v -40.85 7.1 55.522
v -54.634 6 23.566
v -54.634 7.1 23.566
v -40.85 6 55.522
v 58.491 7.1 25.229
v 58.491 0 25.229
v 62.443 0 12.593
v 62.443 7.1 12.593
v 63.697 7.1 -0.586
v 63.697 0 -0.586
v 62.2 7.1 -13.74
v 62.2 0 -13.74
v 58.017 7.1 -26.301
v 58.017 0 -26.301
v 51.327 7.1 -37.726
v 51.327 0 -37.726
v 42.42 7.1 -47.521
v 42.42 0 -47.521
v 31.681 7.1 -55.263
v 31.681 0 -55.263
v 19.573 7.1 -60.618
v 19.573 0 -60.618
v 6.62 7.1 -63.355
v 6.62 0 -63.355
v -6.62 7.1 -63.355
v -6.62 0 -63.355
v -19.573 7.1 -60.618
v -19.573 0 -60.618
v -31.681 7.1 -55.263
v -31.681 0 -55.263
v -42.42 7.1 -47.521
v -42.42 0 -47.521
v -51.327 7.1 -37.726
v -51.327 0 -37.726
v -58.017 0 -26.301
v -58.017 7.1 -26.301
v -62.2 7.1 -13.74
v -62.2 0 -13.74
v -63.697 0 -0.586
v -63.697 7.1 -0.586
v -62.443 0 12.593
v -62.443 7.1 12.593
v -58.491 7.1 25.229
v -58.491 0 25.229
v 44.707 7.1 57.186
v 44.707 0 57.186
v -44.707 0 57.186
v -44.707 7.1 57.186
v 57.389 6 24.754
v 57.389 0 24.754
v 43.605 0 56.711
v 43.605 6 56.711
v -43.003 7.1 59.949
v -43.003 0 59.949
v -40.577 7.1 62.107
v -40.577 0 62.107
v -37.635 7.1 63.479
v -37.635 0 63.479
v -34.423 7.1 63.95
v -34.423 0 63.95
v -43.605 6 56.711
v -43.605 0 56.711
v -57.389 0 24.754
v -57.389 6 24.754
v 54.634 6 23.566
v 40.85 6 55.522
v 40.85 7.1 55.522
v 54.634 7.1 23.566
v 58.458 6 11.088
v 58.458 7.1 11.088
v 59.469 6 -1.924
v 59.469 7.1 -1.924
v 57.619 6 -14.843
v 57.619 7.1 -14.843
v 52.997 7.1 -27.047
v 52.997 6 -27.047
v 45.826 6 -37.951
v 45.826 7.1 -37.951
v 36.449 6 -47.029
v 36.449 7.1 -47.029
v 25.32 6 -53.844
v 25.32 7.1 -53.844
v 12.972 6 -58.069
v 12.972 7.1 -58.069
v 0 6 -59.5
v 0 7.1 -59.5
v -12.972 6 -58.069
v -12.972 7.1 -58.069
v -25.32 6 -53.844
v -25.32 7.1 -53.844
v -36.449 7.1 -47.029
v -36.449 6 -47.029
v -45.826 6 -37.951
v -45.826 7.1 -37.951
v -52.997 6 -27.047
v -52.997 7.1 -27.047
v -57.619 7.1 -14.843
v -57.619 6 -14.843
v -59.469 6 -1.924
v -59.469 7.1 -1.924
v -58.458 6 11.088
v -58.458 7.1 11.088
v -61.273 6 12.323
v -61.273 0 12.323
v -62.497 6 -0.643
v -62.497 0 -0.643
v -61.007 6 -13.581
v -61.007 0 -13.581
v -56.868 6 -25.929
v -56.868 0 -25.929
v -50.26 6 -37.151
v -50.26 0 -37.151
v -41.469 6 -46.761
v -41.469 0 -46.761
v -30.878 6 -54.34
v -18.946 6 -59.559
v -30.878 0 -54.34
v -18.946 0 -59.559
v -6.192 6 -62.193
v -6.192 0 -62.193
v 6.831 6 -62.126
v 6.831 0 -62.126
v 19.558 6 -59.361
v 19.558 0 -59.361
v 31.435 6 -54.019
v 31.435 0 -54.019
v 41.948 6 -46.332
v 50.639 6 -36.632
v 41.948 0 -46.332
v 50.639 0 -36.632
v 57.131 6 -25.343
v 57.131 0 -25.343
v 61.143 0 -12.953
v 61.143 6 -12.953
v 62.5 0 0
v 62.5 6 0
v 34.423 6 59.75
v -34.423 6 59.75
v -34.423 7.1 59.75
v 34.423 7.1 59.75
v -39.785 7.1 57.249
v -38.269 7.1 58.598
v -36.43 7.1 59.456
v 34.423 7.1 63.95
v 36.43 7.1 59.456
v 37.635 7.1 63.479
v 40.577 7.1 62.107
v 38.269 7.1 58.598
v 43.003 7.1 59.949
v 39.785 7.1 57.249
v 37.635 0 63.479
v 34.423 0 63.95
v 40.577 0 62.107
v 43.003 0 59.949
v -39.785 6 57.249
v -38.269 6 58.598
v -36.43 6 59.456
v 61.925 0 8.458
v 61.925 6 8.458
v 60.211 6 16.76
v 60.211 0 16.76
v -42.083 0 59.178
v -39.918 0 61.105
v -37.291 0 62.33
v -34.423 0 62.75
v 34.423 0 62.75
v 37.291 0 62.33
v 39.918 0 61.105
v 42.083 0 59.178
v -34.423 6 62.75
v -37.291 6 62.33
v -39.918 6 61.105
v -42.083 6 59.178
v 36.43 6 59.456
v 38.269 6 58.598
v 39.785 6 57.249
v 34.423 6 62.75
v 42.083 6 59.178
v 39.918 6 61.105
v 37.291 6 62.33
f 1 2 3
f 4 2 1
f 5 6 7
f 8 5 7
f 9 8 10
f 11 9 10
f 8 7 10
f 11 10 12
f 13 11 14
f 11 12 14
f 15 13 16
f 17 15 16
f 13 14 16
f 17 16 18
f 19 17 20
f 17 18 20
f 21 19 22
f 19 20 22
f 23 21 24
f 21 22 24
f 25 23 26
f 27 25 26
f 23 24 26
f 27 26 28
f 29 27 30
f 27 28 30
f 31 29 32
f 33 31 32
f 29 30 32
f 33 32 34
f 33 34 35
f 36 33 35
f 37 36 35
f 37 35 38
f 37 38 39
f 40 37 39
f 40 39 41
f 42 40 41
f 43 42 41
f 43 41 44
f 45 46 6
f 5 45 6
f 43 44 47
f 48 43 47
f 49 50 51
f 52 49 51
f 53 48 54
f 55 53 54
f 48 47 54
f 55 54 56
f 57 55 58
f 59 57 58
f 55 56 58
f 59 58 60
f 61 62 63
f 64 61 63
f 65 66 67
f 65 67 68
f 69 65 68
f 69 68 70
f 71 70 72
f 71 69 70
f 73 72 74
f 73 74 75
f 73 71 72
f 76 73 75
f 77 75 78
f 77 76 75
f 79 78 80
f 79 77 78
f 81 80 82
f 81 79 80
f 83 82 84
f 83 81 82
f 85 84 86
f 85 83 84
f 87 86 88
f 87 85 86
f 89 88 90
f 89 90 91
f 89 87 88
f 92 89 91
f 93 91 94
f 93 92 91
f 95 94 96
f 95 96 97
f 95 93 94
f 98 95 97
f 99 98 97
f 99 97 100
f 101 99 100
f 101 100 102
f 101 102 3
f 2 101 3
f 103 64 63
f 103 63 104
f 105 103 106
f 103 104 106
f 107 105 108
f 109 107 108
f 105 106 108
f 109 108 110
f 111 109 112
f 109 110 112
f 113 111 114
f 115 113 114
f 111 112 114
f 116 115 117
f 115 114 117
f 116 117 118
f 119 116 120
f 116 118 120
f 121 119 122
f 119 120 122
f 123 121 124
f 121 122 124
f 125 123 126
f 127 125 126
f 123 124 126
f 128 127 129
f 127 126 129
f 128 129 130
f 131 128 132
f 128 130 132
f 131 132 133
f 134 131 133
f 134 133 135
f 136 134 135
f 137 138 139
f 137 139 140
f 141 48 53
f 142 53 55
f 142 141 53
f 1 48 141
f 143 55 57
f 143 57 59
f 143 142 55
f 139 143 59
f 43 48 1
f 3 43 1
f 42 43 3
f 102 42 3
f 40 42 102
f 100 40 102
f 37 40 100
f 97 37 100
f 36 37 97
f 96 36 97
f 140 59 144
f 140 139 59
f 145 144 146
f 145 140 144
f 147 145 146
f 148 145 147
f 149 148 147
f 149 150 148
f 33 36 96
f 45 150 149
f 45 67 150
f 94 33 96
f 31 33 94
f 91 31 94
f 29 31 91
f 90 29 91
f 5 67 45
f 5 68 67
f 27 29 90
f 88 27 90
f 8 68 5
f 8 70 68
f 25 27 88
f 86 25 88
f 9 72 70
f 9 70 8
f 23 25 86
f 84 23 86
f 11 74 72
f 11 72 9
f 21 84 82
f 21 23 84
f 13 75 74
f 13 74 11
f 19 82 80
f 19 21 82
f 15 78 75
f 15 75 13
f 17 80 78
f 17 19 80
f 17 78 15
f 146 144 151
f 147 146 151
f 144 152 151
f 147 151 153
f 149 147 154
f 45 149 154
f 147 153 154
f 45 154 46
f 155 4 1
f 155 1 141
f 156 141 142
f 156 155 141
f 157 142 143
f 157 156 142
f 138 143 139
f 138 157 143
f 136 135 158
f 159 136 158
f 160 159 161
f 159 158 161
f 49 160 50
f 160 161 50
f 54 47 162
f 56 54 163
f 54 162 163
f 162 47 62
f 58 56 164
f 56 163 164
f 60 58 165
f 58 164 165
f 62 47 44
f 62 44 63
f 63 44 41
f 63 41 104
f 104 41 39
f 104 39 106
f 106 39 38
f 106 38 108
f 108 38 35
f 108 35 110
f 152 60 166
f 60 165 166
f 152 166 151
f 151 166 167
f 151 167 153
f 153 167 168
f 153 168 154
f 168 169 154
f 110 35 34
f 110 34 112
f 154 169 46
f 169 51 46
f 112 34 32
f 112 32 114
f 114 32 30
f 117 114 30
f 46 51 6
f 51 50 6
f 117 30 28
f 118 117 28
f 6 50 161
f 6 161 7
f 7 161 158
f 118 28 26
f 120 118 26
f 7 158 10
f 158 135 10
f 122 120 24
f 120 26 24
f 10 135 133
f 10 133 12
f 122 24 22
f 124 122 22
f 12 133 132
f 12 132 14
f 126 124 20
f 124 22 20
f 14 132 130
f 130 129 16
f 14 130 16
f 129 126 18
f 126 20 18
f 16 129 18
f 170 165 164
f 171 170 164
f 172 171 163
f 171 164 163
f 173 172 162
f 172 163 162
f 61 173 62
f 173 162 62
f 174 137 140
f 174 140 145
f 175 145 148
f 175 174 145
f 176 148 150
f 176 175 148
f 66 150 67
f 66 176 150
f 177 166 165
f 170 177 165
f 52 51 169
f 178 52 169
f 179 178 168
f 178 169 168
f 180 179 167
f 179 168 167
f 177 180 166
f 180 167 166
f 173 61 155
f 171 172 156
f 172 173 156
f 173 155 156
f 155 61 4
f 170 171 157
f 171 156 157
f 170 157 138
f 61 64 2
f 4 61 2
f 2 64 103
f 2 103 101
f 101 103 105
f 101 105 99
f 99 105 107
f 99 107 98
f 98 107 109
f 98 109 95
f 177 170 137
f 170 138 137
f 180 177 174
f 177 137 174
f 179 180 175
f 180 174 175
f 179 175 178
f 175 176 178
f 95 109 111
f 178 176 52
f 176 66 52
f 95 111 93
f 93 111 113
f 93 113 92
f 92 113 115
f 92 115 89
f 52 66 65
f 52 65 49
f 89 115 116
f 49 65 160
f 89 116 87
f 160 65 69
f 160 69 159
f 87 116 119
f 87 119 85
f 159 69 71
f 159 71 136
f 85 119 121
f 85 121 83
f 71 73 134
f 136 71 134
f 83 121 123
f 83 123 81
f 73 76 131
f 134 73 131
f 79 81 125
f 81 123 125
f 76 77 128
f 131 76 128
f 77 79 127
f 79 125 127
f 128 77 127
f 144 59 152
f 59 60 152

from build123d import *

# Parameters (mm, degrees)
BOSS_EXTRUDE1_DEPTH = 6
BOSS_EXTRUDE2_DEPTH = 1.1


with BuildPart() as part:
    # Sketch1 → Boss-Extrude1 (new body)
    with BuildSketch(Plane(origin=(0, 0, 0), x_dir=(1, 0, 0), z_dir=(0, 1, 0))):
        with BuildLine():
            ThreePointArc((34.422746677, -63.95), (40.577345115, -62.107399108), (44.706859879, -57.185878226))
            Line((44.706859879, -57.185878226), (58.490893839, -25.229057412))
            ThreePointArc((58.490893839, -25.229057412), (0, 63.7), (-58.490893839, -25.229057412))
            Line((-58.490893839, -25.229057412), (-44.706859879, -57.185878226))
            ThreePointArc((-44.706859879, -57.185878226), (-40.577345115, -62.107399108), (-34.422746677, -63.95))
            Line((-34.422746677, -63.95), (34.422746677, -63.95))
        make_face()
        with BuildLine():
            Line((34.422746677, -62.75), (-34.422746677, -62.75))
            ThreePointArc((-34.422746677, -62.75), (-39.917923854, -61.104820632), (-43.604990608, -56.710605559))
            Line((-43.604990608, -56.710605559), (-57.389024568, -24.753784745))
            ThreePointArc((-57.389024568, -24.753784745), (-12.637957994, 61.208921063), (62.5, 0))
            ThreePointArc((62.5, 0), (61.208921063, -12.637957994), (57.389024568, -24.753784745))
            Line((57.389024568, -24.753784745), (43.604990608, -56.710605559))
            ThreePointArc((43.604990608, -56.710605559), (39.917923854, -61.104820632), (34.422746677, -62.75))
        make_face(mode=Mode.SUBTRACT)
    extrude(amount=BOSS_EXTRUDE1_DEPTH)

    # Sketch3 → Boss-Extrude2 (add)
    with BuildSketch(Plane(origin=(0, 6, 0), x_dir=(1, 0, 0), z_dir=(0, 1, 0))):
        with BuildLine():
            Line((-58.490893839, -25.229057412), (-44.706859879, -57.185878226))
            ThreePointArc((-44.706859879, -57.185878226), (-40.577345115, -62.107399108), (-34.422746677, -63.95))
            Line((-34.422746677, -63.95), (34.422746677, -63.95))
            ThreePointArc((34.422746677, -63.95), (40.577345115, -62.107399108), (44.706859879, -57.185878226))
            Line((44.706859879, -57.185878226), (58.490893839, -25.229057412))
            ThreePointArc((58.490893839, -25.229057412), (0, 63.7), (-58.490893839, -25.229057412))
        make_face()
        with BuildLine():
            Line((40.850317428, -55.522423891), (54.634351388, -23.565603077))
            ThreePointArc((54.634351388, -23.565603077), (0, 59.5), (-54.634351388, -23.565603077))
            Line((-54.634351388, -23.565603077), (-40.850317428, -55.522423891))
            ThreePointArc((-40.850317428, -55.522423891), (-38.269370701, -58.598374443), (-34.422746677, -59.75))
            Line((-34.422746677, -59.75), (34.422746677, -59.75))
            ThreePointArc((34.422746677, -59.75), (38.269370701, -58.598374443), (40.850317428, -55.522423891))
        make_face(mode=Mode.SUBTRACT)
    extrude(amount=BOSS_EXTRUDE2_DEPTH)


solid = part.part
